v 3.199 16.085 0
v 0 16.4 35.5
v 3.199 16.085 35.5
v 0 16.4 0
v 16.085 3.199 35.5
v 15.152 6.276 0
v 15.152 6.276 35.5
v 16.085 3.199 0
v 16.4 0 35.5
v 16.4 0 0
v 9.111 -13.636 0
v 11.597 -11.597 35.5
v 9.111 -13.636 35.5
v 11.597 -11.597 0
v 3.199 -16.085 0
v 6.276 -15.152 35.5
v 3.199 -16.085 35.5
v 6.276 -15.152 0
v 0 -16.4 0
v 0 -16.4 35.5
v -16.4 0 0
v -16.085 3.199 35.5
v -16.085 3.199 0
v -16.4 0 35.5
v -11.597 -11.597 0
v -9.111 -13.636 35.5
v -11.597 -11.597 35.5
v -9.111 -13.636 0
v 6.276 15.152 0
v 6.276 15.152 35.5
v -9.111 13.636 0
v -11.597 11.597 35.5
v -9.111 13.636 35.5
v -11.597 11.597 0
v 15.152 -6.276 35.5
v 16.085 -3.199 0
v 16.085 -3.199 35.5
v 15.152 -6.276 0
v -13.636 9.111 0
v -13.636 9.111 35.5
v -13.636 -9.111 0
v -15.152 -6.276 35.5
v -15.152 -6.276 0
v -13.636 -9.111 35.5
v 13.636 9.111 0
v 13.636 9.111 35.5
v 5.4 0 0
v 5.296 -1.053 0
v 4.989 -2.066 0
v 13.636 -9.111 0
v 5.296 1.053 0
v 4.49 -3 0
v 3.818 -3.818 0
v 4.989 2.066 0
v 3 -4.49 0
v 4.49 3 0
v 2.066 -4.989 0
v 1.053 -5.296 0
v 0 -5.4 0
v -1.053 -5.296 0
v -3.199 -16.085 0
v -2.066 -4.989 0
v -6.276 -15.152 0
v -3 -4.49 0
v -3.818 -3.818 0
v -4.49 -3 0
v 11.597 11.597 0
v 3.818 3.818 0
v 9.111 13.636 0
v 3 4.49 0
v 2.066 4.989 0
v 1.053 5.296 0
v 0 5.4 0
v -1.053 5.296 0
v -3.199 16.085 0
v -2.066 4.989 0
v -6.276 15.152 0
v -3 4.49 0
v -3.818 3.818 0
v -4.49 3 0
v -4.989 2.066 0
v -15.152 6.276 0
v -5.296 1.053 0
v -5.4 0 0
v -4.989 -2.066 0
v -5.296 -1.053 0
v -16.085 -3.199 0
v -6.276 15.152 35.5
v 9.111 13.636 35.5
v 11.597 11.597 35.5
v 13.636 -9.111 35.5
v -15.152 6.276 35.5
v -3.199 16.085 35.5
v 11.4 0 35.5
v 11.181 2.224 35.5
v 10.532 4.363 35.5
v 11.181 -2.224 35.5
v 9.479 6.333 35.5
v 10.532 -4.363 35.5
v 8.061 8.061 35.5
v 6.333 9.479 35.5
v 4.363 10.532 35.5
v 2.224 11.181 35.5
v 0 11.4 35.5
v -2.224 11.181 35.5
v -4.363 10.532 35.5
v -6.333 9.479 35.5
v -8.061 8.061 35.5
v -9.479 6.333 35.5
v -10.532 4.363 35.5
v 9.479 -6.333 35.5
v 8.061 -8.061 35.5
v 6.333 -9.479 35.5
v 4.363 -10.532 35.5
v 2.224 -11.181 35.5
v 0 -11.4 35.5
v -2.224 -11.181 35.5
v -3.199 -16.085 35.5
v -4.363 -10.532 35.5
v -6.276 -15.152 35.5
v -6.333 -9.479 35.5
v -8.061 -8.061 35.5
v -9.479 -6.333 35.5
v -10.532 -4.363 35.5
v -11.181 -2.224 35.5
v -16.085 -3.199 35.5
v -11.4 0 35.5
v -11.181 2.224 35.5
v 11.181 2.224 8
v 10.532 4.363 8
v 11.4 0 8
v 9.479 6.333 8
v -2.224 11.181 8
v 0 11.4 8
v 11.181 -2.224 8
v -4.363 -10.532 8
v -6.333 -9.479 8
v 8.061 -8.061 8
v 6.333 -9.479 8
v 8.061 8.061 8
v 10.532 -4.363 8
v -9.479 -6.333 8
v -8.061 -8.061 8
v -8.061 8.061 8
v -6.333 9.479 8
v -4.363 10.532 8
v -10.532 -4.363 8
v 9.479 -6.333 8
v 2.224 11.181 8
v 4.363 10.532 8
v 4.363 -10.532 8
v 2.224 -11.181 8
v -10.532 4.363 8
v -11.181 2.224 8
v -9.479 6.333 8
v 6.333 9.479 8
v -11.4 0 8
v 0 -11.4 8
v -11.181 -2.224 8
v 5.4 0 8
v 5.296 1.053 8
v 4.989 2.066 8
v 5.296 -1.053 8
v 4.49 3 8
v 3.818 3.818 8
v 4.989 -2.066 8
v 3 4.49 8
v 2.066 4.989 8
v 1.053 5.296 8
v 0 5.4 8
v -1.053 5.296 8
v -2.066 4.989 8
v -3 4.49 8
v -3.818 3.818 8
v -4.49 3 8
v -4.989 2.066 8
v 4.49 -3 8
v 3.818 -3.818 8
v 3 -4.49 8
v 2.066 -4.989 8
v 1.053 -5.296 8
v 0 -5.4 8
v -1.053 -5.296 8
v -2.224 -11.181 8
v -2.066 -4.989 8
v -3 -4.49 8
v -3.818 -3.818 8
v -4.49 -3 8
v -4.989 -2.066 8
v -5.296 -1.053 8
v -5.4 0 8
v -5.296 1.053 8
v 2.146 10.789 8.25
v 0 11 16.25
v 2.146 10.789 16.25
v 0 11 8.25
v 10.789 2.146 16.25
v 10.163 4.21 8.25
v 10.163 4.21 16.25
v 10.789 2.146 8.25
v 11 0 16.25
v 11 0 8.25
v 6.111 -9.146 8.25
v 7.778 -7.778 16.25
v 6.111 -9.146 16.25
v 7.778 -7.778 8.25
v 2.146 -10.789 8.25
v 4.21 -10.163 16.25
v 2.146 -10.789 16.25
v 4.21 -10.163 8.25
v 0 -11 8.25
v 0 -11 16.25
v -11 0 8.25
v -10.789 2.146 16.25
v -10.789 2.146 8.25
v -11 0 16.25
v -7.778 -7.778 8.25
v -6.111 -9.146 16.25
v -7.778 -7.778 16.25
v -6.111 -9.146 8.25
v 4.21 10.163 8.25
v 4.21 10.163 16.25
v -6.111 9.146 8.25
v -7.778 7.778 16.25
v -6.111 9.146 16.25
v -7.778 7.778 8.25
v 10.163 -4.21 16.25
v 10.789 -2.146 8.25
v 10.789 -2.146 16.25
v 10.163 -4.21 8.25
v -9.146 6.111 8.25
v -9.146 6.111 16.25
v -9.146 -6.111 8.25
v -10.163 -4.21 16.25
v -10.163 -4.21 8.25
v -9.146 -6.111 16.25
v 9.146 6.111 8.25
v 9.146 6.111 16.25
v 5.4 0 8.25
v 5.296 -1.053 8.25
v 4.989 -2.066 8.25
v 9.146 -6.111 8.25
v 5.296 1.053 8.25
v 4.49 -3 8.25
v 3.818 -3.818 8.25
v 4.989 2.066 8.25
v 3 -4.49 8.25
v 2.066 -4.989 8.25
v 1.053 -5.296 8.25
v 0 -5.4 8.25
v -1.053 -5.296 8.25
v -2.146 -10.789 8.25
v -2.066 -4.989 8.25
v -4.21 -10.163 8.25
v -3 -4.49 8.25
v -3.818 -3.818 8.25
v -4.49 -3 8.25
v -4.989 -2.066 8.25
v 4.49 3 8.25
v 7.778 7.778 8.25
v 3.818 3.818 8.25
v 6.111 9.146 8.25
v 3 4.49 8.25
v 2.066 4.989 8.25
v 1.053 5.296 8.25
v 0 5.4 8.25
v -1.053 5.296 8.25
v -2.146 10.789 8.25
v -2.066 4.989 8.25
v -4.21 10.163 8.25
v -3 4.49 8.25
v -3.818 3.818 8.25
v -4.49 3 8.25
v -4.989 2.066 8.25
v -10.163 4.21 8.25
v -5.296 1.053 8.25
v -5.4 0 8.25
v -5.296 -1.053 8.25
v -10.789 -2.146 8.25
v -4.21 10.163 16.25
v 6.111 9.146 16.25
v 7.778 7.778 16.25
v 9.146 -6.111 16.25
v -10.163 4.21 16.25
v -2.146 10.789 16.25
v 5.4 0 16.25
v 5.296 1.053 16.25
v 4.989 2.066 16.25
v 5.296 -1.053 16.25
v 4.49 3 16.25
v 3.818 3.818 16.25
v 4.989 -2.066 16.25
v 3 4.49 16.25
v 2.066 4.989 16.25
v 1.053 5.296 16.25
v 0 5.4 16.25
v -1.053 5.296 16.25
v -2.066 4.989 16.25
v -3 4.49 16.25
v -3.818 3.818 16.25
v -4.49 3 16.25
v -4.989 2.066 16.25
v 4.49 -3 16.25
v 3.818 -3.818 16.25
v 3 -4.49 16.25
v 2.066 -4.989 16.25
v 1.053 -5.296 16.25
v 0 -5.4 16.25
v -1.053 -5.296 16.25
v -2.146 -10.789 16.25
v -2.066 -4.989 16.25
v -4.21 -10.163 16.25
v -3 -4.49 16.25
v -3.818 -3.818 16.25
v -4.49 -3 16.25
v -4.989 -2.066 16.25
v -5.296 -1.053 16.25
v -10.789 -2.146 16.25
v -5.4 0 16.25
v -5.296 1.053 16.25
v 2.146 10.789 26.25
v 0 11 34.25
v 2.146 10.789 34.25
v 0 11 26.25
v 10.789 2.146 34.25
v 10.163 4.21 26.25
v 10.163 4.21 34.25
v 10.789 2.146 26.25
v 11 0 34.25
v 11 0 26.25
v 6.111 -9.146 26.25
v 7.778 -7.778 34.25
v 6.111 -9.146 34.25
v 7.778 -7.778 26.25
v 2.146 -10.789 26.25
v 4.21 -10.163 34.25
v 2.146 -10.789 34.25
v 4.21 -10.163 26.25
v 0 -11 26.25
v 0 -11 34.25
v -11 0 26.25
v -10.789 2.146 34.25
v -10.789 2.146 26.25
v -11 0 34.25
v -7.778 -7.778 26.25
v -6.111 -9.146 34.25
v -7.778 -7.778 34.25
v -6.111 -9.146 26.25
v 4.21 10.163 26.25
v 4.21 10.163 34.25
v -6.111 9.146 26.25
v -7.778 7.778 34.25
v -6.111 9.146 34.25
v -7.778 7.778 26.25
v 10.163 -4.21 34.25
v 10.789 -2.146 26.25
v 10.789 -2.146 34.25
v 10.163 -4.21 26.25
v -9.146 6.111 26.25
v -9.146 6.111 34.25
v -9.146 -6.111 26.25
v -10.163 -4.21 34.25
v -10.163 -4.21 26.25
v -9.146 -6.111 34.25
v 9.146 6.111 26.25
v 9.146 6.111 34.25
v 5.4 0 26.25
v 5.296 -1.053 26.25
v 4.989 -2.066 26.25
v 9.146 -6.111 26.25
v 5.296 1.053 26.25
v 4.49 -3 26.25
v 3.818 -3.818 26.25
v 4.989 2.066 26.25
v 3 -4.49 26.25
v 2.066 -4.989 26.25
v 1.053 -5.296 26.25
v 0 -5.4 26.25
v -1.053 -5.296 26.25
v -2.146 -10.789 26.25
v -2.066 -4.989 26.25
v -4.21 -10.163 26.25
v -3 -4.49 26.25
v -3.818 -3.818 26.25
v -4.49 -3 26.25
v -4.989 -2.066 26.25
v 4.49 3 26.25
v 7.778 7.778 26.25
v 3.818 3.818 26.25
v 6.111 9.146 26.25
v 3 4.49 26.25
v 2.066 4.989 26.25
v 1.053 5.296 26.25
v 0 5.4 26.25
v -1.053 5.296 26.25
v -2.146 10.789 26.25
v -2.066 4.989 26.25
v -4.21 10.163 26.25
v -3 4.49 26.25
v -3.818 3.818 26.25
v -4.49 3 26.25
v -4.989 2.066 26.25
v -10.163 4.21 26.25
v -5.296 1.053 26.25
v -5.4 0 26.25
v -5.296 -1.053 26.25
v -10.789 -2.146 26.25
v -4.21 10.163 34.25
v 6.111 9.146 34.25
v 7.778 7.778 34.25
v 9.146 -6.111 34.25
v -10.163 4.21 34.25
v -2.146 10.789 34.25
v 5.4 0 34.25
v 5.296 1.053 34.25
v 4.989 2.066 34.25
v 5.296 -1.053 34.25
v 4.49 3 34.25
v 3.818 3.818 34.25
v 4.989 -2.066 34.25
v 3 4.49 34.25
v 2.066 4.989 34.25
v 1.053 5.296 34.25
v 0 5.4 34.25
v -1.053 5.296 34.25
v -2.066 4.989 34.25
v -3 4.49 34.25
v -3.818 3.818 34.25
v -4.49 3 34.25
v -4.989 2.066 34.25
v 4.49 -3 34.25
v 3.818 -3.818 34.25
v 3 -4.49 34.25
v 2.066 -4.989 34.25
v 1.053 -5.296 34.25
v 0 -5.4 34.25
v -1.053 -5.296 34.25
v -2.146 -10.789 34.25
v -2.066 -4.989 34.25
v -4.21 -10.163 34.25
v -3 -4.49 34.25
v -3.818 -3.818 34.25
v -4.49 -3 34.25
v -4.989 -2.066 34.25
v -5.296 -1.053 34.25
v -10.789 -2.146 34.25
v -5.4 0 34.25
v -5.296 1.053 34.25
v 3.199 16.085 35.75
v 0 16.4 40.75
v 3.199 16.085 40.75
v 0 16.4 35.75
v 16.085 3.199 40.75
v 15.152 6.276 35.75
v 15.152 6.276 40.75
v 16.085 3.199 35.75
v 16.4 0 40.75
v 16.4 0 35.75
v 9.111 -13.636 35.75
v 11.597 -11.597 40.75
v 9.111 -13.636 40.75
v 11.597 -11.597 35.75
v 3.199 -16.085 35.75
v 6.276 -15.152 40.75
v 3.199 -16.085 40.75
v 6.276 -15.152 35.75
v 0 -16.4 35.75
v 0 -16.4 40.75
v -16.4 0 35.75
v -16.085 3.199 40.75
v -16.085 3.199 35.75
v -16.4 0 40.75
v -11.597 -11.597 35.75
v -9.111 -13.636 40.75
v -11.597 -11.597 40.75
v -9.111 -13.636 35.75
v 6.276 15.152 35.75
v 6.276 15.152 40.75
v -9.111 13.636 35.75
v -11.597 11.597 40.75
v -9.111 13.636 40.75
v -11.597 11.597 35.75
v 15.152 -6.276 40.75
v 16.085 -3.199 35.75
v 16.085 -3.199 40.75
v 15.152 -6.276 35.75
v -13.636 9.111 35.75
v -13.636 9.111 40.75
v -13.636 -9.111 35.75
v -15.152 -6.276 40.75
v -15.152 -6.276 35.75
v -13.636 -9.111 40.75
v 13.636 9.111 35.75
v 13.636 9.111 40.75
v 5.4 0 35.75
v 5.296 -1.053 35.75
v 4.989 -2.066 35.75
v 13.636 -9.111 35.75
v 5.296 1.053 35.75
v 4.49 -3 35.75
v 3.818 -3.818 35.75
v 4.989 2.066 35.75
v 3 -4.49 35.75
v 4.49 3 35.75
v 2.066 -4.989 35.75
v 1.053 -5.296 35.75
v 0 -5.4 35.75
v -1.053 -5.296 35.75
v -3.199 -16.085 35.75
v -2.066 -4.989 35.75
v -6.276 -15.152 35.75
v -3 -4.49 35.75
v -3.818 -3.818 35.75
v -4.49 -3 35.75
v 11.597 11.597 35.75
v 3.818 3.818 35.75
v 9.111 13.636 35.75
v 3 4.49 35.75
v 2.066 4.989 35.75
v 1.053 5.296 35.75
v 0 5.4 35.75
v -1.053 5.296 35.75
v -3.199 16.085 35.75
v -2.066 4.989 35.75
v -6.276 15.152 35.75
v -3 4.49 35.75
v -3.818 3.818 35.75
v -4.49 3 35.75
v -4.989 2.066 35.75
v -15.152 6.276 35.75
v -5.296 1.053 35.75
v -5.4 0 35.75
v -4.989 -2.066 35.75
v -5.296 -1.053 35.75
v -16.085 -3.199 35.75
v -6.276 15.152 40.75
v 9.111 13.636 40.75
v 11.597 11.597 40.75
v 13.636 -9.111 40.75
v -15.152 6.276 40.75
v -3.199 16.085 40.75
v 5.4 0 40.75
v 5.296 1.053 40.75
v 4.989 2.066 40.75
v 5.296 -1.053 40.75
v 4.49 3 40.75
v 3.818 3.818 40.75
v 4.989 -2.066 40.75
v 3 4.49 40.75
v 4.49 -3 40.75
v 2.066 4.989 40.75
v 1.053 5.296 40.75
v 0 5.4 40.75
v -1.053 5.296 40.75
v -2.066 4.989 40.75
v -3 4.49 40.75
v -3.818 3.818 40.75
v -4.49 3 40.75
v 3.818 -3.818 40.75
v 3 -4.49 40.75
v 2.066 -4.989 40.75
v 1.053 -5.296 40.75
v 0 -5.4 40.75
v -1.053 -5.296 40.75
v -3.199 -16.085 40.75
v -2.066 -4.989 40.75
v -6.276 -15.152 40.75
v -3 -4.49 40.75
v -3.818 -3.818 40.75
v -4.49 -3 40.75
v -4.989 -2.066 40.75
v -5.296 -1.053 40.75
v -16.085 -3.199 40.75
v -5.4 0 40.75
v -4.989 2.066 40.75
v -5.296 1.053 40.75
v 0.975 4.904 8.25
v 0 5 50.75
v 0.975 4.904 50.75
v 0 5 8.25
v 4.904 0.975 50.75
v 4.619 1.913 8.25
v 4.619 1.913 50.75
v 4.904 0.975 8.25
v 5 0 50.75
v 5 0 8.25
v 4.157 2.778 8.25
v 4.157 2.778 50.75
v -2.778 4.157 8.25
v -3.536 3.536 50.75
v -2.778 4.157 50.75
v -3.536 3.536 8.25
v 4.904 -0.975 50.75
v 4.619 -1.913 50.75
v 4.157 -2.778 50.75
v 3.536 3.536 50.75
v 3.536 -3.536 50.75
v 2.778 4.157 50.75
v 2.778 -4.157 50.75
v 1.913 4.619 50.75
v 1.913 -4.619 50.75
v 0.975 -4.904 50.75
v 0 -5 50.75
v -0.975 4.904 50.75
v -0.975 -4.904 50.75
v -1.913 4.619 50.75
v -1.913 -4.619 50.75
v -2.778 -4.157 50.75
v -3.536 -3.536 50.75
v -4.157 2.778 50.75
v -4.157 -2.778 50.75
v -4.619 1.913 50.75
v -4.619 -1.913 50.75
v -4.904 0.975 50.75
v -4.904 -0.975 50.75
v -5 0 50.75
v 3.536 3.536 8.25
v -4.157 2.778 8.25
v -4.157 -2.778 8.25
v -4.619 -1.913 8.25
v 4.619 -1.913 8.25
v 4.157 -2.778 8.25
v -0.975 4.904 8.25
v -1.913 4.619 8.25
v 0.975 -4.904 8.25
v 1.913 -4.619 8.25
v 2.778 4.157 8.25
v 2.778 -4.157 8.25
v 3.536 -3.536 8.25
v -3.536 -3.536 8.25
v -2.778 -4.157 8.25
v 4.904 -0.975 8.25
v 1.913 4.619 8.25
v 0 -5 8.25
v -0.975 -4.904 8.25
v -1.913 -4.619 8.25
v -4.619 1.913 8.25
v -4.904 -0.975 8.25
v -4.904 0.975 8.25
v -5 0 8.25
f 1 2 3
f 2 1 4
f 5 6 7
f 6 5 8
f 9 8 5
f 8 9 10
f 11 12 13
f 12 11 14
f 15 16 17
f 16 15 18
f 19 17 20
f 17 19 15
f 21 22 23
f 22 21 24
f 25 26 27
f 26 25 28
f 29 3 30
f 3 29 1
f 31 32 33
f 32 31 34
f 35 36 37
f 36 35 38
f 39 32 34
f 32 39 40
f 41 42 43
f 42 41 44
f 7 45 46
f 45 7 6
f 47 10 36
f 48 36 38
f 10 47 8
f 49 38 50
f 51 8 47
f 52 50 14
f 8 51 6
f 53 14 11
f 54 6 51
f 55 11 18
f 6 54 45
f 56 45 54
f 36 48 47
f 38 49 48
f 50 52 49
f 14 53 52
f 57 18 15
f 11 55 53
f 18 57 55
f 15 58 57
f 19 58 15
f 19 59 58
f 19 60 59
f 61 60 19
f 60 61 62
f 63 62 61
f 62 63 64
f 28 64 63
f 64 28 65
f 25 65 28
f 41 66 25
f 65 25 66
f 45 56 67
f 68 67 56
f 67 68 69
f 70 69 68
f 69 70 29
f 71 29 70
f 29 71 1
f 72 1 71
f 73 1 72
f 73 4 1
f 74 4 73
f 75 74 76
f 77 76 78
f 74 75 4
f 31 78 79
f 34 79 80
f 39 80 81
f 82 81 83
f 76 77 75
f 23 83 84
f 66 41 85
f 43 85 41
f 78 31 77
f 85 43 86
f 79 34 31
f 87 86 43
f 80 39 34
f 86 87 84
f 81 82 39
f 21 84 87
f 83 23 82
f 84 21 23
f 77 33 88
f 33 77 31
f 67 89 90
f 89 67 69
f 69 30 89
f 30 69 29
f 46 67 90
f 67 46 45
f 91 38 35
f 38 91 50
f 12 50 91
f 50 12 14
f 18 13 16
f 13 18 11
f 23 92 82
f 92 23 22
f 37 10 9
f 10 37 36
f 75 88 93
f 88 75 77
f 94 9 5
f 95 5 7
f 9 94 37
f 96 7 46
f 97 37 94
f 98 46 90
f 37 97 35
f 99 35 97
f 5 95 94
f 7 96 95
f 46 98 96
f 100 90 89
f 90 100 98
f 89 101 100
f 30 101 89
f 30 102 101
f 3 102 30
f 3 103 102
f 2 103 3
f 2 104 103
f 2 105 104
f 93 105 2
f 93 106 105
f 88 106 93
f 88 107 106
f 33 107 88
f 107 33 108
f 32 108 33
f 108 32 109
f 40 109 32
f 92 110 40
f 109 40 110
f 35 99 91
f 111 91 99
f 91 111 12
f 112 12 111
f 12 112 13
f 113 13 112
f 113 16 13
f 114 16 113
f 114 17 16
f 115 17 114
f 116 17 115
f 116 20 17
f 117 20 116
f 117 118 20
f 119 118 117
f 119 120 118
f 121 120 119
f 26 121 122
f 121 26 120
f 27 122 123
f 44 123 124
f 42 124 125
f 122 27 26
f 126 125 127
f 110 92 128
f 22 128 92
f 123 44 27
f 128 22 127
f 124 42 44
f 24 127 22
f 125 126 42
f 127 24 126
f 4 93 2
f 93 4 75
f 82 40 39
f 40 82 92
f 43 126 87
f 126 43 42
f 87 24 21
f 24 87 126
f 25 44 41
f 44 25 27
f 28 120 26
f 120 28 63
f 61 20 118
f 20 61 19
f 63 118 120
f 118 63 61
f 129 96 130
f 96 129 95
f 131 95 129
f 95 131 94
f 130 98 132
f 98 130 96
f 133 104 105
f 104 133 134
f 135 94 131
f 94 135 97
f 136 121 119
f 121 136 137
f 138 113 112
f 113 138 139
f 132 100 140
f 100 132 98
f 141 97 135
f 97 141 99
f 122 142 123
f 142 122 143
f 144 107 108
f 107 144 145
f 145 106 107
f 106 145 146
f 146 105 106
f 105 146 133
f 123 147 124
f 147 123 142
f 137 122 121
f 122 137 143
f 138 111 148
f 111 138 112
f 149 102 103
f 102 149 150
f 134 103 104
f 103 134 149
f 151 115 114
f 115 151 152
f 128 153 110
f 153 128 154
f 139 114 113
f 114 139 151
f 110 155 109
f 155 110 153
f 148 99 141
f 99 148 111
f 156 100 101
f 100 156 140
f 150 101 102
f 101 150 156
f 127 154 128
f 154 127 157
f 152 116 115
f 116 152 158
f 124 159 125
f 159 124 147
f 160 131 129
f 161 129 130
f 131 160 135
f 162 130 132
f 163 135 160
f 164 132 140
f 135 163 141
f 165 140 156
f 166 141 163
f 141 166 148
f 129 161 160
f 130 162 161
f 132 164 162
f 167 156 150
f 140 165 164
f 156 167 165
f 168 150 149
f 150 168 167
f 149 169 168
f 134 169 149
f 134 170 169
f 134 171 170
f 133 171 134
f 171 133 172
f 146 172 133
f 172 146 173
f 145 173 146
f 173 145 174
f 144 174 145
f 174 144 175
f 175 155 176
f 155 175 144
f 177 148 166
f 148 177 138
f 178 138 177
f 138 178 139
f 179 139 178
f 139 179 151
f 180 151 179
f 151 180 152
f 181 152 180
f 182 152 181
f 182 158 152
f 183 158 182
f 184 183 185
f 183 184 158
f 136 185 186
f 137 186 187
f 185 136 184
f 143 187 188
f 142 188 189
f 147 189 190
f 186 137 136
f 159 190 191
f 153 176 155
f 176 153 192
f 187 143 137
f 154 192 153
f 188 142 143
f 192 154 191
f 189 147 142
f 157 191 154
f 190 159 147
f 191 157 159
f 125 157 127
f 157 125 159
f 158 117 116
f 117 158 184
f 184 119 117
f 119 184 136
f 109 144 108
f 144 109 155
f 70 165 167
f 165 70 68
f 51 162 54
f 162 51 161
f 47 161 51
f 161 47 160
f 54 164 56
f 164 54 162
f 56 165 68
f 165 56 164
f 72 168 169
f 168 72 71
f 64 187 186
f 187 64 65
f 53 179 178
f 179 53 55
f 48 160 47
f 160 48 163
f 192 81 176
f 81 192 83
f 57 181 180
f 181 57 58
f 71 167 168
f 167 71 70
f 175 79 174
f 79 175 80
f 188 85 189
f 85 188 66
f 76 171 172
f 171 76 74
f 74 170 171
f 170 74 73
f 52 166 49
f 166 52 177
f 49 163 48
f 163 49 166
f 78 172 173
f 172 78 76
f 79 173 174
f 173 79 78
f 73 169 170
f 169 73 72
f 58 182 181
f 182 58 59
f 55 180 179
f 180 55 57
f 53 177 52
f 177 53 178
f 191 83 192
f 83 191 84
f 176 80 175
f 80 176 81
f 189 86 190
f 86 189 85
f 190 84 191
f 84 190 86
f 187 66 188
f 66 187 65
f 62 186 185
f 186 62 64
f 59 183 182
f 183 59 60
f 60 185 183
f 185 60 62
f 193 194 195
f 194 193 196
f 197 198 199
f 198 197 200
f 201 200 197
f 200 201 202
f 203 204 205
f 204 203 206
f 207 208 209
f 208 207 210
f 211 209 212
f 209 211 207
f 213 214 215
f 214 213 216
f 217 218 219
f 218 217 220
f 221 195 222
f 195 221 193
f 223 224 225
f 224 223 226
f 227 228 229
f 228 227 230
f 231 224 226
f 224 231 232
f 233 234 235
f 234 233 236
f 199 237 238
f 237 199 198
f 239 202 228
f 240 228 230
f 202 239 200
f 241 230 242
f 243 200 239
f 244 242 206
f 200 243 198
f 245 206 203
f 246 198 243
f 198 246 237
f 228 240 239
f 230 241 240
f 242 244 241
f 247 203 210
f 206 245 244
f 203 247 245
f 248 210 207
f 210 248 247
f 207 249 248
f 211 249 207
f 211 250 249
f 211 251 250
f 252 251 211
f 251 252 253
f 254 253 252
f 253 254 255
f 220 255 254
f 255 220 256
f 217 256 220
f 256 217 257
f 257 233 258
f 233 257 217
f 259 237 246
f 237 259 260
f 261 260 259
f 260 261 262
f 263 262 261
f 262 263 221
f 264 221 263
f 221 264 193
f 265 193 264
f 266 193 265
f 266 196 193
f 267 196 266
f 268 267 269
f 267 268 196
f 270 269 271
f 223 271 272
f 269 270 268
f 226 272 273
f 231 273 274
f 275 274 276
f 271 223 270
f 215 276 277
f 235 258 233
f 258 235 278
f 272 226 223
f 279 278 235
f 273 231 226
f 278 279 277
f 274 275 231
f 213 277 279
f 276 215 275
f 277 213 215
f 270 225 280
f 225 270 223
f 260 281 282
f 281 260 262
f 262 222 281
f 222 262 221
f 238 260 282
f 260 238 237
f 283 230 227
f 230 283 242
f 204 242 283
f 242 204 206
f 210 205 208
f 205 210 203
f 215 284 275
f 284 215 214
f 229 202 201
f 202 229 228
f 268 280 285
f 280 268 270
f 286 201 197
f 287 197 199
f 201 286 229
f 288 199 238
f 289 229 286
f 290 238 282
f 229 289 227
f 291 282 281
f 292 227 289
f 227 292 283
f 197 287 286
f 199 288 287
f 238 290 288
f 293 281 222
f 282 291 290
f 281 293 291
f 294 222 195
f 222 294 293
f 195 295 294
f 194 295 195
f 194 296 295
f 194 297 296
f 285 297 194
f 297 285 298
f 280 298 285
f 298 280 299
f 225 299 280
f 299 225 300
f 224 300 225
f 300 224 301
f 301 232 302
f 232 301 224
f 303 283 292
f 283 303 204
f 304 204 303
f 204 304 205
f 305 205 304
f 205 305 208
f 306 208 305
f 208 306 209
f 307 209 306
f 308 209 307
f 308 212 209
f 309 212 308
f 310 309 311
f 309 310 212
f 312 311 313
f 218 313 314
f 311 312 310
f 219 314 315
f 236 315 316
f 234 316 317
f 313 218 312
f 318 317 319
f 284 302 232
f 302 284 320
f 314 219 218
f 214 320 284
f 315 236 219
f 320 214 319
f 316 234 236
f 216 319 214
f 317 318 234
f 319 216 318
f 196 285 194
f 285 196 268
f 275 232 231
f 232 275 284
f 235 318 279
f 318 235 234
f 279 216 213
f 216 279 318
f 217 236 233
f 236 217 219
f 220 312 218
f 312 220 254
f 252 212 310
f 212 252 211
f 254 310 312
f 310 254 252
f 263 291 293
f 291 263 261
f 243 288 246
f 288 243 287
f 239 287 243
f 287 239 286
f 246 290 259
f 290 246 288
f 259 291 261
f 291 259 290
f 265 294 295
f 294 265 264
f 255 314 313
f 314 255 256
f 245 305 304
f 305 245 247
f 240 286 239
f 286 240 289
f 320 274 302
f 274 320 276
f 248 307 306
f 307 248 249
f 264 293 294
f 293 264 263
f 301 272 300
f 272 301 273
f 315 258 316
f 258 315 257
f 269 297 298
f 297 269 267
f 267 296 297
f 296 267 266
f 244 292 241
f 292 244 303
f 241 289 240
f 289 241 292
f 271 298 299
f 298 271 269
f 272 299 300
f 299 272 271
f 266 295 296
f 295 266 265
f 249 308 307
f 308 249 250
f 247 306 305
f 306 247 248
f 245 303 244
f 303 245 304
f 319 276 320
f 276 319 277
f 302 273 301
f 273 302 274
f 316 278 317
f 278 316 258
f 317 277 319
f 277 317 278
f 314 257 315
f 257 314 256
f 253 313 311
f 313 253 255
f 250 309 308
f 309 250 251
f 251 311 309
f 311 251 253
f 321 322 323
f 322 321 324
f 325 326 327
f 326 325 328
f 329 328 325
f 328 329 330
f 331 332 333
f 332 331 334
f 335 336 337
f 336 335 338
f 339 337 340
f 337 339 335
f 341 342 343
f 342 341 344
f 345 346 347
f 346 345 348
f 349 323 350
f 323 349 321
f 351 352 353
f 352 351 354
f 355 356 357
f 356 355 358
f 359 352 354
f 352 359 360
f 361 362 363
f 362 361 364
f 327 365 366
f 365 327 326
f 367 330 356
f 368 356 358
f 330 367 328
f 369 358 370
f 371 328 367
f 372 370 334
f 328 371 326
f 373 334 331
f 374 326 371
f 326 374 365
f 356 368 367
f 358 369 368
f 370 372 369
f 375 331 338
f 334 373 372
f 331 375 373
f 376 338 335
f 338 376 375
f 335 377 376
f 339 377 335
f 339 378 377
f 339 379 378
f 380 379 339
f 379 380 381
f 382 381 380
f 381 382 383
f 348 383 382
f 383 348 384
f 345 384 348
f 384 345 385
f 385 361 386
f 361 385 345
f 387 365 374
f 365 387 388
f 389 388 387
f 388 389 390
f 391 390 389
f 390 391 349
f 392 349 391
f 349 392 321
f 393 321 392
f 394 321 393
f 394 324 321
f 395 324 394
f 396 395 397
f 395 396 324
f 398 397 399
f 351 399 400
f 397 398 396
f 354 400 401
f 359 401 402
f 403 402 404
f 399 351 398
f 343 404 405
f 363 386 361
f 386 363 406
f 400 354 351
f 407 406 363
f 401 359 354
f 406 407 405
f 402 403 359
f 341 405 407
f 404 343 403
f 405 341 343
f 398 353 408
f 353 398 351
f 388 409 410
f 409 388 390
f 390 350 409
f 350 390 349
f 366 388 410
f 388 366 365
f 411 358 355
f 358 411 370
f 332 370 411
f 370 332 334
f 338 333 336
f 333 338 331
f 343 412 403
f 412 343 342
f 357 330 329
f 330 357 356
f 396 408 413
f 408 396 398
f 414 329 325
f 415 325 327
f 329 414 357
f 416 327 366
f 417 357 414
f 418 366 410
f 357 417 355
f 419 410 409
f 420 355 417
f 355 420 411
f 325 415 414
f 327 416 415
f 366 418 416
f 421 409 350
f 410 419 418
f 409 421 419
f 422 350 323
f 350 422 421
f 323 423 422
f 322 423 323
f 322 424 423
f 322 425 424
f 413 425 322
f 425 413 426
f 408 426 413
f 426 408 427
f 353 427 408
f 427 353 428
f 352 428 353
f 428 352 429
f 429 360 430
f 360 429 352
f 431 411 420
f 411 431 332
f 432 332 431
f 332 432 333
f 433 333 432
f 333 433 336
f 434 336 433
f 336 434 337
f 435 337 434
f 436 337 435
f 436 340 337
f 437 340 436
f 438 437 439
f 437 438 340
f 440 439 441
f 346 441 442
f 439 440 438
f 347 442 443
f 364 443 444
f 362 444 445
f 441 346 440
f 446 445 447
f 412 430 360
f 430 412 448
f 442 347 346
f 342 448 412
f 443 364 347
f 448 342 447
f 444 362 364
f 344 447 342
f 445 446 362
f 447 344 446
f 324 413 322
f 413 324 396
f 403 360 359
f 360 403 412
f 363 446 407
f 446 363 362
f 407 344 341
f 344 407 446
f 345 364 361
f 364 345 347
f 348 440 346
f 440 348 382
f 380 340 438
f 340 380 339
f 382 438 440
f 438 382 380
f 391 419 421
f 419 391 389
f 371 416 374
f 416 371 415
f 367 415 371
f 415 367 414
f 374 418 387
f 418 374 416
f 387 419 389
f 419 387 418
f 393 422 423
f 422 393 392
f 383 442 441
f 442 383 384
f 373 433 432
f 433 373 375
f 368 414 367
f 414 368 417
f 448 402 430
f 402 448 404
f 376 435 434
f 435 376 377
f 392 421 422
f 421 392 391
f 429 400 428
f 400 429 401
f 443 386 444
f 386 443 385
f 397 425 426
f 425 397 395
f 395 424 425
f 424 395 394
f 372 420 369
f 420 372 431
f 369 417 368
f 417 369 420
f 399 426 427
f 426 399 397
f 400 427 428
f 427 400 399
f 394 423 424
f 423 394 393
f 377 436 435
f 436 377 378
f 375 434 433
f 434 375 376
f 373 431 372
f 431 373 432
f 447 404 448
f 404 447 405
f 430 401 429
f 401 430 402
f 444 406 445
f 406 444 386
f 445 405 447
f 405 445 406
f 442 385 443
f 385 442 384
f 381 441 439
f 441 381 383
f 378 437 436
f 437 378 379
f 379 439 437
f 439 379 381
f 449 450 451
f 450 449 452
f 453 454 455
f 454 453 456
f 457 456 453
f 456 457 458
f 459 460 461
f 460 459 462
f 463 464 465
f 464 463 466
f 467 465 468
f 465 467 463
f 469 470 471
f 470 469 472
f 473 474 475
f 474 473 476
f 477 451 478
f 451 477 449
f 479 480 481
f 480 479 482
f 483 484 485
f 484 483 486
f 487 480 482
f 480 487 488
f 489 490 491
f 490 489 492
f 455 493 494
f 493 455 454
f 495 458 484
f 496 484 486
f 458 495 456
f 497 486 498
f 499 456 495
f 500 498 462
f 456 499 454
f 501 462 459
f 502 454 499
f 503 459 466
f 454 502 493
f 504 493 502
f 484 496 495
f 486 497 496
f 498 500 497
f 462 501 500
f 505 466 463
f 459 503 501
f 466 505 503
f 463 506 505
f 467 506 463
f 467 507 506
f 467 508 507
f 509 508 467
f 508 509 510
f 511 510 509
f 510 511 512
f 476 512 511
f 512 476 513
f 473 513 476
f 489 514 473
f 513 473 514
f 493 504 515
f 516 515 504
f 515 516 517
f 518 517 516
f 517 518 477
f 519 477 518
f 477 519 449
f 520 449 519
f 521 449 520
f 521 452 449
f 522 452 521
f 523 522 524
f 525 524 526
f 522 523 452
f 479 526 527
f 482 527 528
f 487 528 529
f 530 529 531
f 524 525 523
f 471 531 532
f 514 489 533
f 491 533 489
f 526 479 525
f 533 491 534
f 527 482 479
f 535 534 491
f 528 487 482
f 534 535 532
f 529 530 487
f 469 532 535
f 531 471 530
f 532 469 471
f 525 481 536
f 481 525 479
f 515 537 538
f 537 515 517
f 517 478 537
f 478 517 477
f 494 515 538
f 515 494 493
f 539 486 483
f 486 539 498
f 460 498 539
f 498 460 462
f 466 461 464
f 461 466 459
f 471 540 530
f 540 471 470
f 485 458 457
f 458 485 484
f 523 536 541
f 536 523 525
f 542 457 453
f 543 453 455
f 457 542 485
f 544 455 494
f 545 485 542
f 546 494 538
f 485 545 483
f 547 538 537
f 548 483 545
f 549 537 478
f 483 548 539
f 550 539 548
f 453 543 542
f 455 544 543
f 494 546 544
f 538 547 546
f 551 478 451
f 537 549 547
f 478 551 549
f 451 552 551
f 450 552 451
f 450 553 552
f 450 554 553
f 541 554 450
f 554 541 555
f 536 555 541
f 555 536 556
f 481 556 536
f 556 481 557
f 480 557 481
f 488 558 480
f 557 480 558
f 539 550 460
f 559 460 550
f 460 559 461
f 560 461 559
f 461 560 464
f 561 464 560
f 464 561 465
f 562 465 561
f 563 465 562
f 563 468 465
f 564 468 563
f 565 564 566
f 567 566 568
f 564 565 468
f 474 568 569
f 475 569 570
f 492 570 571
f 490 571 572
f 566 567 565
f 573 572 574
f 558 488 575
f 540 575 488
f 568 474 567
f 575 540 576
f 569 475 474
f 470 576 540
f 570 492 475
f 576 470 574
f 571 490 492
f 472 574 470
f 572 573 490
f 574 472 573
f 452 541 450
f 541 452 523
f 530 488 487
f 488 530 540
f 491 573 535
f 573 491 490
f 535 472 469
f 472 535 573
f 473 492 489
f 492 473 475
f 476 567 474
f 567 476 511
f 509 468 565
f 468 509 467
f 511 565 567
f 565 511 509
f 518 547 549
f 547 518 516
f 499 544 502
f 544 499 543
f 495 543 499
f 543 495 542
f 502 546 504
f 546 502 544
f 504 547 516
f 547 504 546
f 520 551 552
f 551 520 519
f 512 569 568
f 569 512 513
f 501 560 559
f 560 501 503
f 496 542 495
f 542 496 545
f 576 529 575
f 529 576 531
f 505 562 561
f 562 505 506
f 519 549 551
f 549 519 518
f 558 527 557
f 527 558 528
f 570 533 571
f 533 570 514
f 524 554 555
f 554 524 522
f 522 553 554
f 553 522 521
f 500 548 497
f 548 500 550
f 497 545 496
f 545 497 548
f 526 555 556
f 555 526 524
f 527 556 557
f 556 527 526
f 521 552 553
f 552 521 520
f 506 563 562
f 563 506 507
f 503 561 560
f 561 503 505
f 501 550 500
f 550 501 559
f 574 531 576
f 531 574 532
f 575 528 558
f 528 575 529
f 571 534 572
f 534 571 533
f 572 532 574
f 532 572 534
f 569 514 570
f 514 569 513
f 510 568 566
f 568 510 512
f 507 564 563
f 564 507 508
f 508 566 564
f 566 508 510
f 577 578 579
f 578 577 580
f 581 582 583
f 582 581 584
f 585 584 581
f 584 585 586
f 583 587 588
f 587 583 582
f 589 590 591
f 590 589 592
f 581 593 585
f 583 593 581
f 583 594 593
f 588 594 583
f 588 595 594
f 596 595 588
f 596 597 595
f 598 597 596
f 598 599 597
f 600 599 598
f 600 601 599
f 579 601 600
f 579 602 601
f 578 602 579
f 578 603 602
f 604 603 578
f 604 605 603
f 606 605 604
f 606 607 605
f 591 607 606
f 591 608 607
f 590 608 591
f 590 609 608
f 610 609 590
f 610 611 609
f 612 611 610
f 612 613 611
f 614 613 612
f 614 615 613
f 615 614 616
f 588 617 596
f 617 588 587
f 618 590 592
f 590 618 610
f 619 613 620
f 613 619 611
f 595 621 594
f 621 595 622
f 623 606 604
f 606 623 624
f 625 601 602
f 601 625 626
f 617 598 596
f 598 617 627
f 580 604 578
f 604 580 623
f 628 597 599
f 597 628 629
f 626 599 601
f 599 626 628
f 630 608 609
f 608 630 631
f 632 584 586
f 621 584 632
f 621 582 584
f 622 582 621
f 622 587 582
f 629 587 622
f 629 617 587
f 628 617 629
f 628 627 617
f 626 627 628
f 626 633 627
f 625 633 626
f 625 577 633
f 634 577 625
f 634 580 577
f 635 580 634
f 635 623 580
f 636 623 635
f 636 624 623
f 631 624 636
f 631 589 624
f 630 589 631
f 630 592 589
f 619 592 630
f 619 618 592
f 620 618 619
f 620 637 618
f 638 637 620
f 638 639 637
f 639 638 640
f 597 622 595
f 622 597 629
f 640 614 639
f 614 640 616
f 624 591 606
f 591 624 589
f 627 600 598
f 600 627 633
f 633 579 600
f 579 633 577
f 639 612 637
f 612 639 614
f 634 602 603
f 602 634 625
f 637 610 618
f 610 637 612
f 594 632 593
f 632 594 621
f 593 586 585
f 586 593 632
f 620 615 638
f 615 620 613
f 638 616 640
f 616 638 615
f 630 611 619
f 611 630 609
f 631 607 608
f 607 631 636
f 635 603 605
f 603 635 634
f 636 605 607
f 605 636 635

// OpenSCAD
$fn = 32;

// ------------------------------------------------------------------------
// Shaft station: cup d32.8 x 35.5 mm, shaft d10
// Every part is its own module, assembly() places every instance.
// ------------------------------------------------------------------------

// --- part 1 ---
module housing_cup() {
  difference() {
    cylinder(h = 35.5, d = 32.8);
    translate([0, 0, 8]) cylinder(h = 28.5, d = 22.8);
    translate([0, 0, -1]) cylinder(h = 10, d = 10.8);
  }
}

// --- part 2 ---
module bearing_lower() {
  difference() {
      translate([0, 0, 0]) cylinder(h = 8, d = 22);
      translate([0, 0, -1]) cylinder(h = 10, d = 10.8);
    }
}

// --- part 3 ---
module bearing_upper() {
  difference() {
      translate([0, 0, 0]) cylinder(h = 8, d = 22);
      translate([0, 0, -1]) cylinder(h = 10, d = 10.8);
    }
}

// --- part 4 ---
module station_shaft() {
  translate([0, 0, -21.25]) cylinder(h = 42.5, d = 10);
}

// --- part 5 ---
module station_cover() {
  difference() {
    cylinder(h = 5, d = 32.8);
    translate([0, 0, -1]) cylinder(h = 7, d = 10.8);
  }
}

// --- assembly ---
module assembly() {
  color([0.80, 0.24, 0.20]) translate([0, 0, 0]) rotate([0, 0, 0]) housing_cup();
  color([0.20, 0.45, 0.75]) translate([0, 0, 8.25]) rotate([0, 0, 0]) bearing_lower();
  color([0.25, 0.62, 0.32]) translate([0, 0, 26.25]) rotate([0, 0, 0]) bearing_upper();
  color([0.92, 0.70, 0.18]) translate([0, 0, 29.5]) rotate([0, 0, 0]) station_shaft();
  color([0.58, 0.35, 0.70]) translate([0, 0, 35.75]) rotate([0, 0, 0]) station_cover();
}

assembly();
